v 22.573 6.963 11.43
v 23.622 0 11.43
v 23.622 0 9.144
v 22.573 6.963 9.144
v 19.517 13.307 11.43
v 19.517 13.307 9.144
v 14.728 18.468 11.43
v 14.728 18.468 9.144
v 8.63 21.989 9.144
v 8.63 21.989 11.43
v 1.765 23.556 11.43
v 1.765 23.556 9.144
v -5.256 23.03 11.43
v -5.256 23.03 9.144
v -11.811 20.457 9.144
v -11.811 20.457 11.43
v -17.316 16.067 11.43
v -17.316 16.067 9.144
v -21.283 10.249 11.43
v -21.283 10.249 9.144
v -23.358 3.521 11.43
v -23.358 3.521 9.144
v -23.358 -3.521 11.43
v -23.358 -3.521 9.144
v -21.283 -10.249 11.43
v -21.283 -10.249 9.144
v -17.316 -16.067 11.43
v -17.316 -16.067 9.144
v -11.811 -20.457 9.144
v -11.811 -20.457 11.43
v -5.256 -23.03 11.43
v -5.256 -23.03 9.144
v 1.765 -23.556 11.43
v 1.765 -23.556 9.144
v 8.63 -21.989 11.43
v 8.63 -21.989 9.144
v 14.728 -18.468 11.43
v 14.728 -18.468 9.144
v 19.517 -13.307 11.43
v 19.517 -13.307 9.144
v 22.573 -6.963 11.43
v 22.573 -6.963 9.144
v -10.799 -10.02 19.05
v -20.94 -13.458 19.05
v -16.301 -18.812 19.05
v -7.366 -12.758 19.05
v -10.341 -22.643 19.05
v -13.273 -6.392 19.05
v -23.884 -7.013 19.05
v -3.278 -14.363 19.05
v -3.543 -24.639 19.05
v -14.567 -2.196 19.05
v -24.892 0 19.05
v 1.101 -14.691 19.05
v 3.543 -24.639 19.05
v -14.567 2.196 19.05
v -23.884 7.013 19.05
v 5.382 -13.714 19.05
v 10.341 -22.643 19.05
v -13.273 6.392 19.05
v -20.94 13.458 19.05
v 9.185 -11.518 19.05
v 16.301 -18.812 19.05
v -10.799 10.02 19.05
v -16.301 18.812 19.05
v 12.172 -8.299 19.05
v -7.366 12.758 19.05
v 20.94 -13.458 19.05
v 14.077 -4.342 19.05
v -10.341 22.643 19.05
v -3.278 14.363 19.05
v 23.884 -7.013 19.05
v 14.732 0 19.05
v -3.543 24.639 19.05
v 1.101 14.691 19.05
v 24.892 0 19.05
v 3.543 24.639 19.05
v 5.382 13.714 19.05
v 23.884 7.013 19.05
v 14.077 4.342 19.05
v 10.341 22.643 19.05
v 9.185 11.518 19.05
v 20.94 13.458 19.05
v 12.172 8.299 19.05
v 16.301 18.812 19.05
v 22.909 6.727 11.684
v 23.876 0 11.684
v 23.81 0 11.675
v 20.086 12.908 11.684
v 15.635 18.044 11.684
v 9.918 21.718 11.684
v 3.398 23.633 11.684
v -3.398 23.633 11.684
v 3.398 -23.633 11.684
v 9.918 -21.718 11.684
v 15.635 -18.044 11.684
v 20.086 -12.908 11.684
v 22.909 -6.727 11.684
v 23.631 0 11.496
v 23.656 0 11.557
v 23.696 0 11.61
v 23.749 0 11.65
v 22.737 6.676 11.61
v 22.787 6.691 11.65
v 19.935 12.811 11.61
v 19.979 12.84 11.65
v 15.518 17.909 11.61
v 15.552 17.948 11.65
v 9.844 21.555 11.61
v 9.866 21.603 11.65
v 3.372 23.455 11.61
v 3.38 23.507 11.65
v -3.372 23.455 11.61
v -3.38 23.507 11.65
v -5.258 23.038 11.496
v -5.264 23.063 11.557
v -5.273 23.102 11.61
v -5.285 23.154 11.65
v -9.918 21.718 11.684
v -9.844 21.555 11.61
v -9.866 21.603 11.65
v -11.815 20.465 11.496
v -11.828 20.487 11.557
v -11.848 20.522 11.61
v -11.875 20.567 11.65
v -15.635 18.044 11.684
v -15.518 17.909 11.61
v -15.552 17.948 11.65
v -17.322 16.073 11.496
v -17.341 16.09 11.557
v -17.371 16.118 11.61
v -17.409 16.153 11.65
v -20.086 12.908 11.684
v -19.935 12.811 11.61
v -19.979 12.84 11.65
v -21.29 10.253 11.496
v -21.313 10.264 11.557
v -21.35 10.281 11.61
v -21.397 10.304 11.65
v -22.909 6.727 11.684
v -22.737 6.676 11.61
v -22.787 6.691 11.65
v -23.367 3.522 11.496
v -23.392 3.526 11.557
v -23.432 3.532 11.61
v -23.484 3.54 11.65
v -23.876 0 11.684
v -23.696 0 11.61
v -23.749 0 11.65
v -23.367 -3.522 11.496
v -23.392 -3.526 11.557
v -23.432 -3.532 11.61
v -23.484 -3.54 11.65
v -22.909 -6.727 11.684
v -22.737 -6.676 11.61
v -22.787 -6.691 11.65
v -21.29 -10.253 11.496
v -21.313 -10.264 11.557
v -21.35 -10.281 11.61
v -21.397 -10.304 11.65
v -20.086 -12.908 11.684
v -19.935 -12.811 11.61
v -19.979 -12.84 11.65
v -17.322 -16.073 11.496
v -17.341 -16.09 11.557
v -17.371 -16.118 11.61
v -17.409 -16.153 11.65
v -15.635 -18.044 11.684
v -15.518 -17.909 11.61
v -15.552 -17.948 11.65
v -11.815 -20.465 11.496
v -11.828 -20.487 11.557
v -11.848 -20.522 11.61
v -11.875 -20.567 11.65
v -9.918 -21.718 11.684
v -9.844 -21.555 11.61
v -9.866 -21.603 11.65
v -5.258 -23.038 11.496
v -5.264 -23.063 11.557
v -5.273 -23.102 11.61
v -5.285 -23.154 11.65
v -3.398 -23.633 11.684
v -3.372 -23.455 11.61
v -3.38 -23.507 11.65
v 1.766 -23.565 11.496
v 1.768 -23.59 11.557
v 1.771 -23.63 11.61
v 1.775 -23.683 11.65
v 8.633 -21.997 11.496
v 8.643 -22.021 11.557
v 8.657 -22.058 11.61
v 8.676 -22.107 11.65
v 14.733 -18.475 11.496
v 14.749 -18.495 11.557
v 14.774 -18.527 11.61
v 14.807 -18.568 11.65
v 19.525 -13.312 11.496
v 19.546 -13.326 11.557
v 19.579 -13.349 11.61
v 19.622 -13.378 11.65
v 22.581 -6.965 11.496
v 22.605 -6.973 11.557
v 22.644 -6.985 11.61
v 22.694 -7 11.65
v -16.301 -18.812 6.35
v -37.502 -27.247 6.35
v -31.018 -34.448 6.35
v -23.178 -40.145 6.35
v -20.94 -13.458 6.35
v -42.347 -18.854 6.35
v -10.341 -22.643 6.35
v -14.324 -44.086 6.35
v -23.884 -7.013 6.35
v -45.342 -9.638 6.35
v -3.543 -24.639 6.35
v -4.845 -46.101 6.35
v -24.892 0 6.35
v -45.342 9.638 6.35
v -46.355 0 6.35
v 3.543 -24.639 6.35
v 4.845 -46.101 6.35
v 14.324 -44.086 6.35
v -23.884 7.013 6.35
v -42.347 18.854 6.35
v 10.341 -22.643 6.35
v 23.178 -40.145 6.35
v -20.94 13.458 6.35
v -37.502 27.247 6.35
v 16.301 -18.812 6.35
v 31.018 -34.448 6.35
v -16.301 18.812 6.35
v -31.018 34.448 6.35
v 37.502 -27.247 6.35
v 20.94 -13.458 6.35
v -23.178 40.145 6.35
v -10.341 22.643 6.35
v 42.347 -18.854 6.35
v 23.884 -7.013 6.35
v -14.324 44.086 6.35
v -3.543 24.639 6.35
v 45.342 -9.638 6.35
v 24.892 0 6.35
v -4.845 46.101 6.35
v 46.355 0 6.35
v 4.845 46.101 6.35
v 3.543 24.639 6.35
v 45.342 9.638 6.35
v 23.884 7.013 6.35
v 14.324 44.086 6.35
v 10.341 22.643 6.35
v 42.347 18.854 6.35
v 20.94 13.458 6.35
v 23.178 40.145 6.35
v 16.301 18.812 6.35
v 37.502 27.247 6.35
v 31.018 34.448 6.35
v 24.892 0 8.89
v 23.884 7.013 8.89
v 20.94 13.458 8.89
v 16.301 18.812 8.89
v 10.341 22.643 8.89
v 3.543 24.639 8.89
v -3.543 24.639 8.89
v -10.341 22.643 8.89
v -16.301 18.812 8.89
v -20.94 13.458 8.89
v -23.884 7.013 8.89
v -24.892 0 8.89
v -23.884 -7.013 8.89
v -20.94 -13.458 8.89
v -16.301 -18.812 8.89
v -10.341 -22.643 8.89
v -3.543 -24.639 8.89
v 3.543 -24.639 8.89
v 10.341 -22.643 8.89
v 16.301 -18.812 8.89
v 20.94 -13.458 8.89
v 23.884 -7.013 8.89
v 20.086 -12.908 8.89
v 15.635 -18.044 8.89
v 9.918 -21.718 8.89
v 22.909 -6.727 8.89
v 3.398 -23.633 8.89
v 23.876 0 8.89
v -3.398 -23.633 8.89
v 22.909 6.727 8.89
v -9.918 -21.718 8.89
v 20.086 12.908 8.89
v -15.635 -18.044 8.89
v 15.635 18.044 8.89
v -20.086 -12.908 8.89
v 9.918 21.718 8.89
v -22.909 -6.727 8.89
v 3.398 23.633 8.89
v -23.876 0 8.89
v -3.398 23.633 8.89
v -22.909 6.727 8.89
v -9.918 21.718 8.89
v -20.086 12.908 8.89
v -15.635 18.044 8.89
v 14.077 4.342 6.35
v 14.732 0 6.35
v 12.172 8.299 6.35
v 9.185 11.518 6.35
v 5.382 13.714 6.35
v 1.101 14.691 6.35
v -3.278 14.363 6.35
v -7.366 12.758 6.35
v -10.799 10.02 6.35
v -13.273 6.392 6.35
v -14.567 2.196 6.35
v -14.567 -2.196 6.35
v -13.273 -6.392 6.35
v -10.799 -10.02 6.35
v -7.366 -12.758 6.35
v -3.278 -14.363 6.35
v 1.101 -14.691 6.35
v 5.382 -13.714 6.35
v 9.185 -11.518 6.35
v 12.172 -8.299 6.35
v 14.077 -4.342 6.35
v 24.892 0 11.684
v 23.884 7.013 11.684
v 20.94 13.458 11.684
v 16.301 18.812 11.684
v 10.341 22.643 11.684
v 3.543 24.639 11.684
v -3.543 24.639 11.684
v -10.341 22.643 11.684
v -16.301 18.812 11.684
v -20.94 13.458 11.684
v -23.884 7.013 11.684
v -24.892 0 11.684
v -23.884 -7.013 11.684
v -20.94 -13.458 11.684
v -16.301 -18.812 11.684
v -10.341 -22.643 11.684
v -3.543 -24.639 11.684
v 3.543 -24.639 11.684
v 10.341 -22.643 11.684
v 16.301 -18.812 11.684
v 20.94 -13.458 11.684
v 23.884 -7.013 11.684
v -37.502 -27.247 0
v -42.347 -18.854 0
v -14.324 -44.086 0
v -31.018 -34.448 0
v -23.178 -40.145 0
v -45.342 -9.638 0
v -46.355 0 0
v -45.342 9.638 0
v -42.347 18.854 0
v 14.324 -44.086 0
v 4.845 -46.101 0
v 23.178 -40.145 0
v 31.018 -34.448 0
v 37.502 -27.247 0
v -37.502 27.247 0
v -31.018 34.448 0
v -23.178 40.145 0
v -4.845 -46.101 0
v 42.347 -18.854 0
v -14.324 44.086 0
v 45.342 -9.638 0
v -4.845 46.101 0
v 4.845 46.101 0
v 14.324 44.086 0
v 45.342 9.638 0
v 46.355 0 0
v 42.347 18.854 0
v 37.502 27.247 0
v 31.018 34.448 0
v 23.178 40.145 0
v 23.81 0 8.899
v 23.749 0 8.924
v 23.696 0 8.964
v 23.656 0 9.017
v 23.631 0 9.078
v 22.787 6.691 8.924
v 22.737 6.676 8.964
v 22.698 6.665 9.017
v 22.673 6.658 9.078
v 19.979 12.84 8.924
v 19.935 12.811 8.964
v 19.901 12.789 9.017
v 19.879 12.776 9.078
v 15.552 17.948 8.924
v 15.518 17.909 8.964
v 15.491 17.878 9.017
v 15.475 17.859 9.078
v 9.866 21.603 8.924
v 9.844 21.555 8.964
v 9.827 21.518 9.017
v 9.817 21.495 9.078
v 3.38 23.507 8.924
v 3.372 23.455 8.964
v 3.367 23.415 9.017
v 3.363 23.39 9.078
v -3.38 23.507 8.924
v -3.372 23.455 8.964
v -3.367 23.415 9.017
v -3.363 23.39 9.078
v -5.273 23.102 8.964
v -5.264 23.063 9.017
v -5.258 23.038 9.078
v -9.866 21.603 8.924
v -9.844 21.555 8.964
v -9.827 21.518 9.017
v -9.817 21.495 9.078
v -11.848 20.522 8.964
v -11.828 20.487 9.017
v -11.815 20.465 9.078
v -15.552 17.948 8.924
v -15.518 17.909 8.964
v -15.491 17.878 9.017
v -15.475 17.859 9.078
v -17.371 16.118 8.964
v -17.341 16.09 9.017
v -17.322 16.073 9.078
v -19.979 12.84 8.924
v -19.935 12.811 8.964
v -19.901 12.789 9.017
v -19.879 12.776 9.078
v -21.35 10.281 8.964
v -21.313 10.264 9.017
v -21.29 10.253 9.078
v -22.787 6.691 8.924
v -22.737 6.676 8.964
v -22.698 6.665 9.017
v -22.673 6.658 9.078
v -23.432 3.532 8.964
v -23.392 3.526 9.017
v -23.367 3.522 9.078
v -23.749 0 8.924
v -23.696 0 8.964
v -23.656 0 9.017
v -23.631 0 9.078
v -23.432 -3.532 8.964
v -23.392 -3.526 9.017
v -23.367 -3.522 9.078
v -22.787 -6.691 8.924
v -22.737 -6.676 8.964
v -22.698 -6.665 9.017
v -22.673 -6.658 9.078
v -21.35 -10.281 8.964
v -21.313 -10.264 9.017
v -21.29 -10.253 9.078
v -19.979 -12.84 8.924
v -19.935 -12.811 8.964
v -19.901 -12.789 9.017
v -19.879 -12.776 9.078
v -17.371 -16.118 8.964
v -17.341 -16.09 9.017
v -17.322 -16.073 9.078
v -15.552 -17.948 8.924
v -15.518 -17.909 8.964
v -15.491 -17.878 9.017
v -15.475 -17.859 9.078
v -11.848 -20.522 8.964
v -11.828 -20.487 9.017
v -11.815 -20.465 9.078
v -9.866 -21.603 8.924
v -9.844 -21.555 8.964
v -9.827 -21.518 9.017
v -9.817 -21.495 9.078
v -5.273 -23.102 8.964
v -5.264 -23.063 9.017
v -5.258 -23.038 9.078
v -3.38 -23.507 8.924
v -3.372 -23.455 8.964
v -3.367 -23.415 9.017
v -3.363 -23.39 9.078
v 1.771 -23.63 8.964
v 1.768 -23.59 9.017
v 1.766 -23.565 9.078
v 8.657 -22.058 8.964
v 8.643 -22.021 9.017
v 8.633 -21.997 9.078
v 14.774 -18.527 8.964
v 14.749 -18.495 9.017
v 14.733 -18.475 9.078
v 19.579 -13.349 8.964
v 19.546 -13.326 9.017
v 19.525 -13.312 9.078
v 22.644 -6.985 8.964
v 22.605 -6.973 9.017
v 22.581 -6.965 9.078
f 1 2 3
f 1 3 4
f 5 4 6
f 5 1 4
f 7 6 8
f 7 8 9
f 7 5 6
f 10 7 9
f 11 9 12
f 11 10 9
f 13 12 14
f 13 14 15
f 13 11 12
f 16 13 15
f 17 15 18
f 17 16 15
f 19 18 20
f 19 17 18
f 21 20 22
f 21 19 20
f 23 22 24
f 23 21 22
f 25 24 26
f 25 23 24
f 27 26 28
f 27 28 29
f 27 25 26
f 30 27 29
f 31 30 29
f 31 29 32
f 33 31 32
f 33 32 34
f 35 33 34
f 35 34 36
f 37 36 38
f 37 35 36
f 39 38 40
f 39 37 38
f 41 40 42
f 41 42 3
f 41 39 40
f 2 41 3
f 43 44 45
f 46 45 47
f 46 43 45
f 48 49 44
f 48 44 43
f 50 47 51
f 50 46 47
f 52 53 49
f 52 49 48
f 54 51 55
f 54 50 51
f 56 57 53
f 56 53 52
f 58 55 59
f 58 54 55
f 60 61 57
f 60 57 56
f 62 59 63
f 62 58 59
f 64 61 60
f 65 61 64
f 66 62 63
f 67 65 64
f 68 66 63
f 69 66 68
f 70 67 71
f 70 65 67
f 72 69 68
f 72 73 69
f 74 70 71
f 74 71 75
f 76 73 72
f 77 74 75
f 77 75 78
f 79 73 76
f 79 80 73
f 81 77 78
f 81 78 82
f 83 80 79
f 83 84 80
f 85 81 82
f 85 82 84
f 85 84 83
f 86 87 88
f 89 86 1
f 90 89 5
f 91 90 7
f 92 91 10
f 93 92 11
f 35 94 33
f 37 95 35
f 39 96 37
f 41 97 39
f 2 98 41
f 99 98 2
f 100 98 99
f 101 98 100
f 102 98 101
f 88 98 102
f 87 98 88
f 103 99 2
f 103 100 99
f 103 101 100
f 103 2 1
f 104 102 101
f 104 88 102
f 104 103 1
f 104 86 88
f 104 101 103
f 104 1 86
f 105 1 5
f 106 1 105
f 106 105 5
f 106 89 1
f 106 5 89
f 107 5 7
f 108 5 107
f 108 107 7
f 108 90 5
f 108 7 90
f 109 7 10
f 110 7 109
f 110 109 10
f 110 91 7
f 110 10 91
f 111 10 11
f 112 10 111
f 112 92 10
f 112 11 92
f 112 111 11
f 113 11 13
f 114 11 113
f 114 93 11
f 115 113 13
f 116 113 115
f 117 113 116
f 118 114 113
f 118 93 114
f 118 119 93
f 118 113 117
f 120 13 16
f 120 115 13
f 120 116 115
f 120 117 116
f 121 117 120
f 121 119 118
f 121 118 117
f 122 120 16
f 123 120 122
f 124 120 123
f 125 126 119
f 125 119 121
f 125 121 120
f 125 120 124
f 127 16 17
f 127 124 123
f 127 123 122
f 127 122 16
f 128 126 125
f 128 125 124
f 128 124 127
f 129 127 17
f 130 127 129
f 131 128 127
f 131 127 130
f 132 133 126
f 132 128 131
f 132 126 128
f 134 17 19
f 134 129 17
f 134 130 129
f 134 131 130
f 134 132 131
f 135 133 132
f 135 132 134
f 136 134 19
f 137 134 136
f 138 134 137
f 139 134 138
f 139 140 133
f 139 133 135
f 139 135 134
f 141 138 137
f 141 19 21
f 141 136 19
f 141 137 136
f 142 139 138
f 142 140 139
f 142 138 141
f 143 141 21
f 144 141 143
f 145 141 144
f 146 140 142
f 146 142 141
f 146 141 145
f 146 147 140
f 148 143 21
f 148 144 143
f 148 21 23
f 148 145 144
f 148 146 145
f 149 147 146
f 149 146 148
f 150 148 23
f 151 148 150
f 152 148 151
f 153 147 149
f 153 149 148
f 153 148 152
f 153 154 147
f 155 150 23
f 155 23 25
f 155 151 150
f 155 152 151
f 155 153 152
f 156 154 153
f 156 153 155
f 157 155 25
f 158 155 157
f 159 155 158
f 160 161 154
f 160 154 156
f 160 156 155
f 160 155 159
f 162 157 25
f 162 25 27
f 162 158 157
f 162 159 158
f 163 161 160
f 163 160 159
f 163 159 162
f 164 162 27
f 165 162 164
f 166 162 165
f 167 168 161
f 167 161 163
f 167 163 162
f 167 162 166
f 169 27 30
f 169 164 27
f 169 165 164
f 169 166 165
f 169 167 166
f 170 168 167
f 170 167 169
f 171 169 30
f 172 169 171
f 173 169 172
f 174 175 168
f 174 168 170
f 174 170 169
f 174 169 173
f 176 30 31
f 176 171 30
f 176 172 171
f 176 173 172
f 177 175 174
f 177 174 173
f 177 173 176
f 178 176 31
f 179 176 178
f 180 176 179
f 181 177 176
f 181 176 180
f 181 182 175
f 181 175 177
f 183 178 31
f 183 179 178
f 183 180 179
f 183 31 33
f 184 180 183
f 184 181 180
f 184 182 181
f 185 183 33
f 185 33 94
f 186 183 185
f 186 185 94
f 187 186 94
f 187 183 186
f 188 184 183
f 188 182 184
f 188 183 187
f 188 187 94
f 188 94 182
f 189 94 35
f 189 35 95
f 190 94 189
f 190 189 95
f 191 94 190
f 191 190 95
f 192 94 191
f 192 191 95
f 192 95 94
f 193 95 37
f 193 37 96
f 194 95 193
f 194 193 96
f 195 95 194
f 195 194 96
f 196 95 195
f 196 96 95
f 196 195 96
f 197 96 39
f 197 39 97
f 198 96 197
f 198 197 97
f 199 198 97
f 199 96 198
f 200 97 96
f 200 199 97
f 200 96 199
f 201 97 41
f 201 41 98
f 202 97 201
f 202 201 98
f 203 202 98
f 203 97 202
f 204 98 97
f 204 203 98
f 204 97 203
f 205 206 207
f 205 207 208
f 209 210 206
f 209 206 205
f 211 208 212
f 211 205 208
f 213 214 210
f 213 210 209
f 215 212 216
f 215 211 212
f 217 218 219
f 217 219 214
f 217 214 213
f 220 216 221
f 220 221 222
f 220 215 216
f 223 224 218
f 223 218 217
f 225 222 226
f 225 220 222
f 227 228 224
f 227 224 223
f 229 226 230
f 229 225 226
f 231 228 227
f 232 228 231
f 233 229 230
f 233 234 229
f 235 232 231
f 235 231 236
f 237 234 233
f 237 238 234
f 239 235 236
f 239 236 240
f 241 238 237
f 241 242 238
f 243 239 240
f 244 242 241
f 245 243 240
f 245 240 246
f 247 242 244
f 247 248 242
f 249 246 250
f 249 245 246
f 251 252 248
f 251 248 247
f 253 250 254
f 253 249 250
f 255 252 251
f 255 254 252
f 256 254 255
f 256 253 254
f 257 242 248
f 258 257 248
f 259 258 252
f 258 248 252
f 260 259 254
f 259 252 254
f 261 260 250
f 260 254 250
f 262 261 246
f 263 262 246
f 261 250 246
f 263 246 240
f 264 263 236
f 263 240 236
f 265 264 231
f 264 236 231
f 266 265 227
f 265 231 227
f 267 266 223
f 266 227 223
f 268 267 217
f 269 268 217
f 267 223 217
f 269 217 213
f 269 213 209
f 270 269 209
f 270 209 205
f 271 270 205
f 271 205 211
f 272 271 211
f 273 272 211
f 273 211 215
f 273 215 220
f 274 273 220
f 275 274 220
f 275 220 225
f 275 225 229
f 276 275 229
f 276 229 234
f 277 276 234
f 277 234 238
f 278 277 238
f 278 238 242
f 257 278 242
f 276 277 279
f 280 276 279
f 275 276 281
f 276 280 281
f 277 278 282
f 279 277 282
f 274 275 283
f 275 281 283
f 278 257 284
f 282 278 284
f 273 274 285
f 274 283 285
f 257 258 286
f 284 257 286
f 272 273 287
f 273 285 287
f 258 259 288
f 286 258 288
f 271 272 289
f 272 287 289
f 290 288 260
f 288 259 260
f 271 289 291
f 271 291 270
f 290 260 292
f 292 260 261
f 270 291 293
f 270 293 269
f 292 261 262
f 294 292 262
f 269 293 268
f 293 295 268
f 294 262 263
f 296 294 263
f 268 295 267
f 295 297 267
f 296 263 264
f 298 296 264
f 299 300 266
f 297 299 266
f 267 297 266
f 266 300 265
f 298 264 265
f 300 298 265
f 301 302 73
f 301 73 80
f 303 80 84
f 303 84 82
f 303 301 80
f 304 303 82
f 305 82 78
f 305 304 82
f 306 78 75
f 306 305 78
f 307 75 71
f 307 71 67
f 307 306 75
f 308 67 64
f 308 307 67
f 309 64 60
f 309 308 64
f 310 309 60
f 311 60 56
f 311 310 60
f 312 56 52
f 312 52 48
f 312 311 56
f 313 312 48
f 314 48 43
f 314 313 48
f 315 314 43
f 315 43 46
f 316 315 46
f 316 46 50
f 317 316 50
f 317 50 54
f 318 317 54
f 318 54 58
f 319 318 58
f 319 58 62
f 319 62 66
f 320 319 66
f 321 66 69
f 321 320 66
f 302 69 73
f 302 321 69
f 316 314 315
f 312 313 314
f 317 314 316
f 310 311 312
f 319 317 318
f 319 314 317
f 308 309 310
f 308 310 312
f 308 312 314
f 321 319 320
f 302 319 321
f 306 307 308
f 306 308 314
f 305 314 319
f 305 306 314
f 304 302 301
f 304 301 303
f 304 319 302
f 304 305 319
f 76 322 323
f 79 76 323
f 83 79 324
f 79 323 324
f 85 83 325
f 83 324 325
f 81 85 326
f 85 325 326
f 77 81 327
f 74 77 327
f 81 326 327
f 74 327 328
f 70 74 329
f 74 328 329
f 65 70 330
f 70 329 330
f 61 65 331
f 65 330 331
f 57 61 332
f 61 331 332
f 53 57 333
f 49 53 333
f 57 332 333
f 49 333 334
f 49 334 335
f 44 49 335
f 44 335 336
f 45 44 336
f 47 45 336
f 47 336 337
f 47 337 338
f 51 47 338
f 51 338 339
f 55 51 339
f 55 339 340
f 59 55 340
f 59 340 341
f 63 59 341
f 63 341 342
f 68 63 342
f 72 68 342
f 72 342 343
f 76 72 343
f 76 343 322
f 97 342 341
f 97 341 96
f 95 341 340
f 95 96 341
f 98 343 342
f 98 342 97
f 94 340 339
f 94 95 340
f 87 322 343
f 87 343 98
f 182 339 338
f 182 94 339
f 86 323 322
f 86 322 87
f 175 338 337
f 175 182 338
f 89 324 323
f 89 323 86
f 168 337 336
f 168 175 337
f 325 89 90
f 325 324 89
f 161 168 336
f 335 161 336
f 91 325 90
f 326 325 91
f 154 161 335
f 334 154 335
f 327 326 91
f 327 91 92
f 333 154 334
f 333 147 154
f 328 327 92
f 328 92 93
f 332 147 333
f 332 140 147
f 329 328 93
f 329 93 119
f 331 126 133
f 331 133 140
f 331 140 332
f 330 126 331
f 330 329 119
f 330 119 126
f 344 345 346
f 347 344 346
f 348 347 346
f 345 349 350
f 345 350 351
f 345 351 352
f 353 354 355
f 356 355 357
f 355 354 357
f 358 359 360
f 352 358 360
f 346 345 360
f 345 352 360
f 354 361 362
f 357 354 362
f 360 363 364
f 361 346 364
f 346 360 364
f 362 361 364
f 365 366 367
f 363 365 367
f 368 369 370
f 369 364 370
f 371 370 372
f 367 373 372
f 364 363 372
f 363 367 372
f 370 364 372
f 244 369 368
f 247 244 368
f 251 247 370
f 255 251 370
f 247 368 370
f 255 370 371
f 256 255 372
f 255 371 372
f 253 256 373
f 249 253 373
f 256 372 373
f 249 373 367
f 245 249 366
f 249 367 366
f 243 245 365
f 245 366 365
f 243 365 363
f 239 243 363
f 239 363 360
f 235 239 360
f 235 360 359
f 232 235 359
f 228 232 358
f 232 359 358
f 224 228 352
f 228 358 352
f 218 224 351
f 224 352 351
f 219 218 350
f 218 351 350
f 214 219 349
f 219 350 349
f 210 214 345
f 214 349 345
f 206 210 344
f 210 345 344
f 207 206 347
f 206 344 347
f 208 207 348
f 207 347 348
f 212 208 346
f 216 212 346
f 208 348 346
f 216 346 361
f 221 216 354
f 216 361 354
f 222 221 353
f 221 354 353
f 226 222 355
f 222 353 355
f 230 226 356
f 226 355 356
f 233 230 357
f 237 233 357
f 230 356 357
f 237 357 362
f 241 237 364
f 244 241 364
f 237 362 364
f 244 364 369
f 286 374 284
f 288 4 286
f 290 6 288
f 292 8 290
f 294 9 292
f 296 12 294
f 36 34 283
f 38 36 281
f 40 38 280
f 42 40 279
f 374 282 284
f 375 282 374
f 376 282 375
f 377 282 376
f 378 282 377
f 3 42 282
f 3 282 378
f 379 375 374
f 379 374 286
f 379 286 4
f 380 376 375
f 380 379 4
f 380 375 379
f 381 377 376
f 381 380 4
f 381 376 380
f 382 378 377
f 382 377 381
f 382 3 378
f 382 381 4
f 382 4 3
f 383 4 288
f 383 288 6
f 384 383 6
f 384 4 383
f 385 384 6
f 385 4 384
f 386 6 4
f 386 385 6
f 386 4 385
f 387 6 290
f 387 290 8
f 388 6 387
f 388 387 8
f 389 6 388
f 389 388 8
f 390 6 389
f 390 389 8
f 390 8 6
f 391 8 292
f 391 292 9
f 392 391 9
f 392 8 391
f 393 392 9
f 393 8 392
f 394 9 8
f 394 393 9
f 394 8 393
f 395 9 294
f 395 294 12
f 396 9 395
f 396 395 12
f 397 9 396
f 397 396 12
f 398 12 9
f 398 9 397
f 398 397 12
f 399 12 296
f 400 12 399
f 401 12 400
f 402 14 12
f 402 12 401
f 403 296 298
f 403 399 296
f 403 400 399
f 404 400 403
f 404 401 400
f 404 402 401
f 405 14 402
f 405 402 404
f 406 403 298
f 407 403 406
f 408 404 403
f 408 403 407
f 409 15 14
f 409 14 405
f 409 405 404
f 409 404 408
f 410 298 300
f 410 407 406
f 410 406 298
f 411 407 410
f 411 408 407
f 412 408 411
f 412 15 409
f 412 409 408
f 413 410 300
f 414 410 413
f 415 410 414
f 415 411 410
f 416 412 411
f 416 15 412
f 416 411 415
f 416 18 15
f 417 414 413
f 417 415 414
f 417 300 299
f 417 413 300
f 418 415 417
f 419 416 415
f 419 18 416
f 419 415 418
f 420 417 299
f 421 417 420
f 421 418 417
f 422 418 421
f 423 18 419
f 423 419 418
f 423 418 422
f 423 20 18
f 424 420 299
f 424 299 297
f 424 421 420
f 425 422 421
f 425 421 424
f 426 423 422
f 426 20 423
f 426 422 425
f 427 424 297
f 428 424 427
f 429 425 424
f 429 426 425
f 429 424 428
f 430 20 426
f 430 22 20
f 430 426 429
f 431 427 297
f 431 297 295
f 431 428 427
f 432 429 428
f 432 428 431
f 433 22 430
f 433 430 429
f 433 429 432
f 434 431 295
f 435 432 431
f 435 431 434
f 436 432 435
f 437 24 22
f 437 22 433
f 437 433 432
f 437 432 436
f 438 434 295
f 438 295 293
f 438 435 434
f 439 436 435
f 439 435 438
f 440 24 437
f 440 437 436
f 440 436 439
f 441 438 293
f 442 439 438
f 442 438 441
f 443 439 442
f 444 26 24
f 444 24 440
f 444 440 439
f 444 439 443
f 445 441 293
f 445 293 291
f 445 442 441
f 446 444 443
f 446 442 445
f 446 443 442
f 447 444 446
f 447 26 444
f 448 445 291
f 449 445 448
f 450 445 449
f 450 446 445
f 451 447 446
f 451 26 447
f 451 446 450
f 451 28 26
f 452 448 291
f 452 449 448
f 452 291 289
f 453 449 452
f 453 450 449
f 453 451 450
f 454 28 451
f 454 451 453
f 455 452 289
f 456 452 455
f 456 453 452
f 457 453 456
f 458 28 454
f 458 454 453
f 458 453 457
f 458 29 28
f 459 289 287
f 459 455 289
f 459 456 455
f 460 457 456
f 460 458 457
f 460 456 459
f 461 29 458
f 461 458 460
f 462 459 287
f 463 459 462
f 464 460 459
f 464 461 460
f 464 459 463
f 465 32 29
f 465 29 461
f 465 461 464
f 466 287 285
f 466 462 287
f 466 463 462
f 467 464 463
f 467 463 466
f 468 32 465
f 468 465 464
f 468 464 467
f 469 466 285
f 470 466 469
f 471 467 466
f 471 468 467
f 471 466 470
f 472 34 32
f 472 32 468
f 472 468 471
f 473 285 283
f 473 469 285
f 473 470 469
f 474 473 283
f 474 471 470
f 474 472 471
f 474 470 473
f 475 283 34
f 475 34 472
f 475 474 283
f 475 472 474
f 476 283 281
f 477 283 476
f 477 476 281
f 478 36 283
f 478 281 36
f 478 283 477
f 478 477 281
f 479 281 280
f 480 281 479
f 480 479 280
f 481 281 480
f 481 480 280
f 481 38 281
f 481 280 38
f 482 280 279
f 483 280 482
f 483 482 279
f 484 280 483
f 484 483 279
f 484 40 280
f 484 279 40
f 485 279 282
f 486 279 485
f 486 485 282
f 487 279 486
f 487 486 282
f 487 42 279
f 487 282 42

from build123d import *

# Parameters (mm, degrees)
F0_R     = 46.355
F1_DEPTH = 6.35
F2_R     = 24.892
F2_R_2   = 14.732
F3_DEPTH = 12.7
F4_W     = 1.27
F4_H     = 2.794
F6_R     = 0.254


with BuildPart() as f1:
    # F0 (on Top) → F1 (new body)
    with BuildSketch(Plane.XY):
        Circle(F0_R)
    extrude(amount=F1_DEPTH)

    # F2 (on face) → F3 (join)
    with BuildSketch(Plane.XY.offset(6.35)):
        Circle(F2_R)
        Circle(F2_R_2, mode=Mode.SUBTRACT)
    extrude(amount=F3_DEPTH)

    # F4 (on Front) → F5 (revolve, cut)
    with BuildSketch(Plane.XZ):
        with Locations((24.257, 10.287)):
            Rectangle(F4_W, F4_H)
    revolve(axis=Axis((0, 0, 4.445), (0, 0, 1)), mode=Mode.SUBTRACT)

    # F6
    f6_edges = [f1.edges().sort_by_distance(p)[0] for p in [
        (-23.622, 0, 11.684),
        (-23.622, 0, 8.89),
    ]]
    fillet(f6_edges, radius=F6_R)


solid = f1.part
